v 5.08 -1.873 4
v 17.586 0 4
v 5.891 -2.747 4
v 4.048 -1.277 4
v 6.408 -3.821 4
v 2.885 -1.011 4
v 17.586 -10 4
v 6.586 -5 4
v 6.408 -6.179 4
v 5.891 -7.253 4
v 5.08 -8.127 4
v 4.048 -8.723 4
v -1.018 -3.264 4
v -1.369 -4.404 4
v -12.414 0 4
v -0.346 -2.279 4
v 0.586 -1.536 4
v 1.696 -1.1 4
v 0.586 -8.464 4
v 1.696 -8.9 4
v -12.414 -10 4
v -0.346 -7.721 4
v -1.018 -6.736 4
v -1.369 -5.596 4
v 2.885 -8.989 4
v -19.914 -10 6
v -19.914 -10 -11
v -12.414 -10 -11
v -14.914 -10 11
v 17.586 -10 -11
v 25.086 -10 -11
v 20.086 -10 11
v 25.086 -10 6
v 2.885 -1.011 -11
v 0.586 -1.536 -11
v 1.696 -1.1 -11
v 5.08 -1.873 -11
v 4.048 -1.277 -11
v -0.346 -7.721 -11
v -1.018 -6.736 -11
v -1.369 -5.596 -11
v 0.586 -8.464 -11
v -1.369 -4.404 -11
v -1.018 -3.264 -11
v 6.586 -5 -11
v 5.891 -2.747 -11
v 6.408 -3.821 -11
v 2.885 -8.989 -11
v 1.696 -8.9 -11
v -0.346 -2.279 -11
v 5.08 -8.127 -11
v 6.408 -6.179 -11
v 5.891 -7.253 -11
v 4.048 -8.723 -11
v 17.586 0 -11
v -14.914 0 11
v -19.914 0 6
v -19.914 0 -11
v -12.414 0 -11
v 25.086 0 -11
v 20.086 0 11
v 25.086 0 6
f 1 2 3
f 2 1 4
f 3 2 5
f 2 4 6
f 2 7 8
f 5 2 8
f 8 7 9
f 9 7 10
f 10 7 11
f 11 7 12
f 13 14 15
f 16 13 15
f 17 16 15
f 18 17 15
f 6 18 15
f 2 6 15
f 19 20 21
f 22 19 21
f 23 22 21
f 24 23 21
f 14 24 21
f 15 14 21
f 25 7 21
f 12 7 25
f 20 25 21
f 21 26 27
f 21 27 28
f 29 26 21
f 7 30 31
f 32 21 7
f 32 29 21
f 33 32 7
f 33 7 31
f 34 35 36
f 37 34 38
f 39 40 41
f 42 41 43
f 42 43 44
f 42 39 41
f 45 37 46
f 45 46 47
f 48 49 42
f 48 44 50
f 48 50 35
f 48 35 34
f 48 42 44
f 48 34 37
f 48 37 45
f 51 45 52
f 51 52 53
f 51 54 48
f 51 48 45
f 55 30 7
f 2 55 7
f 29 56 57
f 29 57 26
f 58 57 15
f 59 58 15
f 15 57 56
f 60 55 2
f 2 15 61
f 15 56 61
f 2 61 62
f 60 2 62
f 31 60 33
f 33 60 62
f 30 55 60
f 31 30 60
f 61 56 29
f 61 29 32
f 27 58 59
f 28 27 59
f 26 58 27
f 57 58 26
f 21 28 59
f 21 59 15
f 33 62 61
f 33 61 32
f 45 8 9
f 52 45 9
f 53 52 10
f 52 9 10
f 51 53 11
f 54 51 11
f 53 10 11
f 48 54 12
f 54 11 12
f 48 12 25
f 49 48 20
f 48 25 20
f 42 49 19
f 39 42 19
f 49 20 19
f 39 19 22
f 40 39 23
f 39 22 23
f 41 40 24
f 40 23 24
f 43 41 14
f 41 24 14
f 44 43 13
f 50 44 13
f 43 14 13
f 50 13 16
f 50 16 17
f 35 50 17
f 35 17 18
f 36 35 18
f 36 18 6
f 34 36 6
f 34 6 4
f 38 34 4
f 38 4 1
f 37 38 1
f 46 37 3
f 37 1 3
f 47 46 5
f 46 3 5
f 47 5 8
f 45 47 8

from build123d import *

# Parameters (mm, degrees)
F0_W     = 45
F0_H     = 22
F1_DEPTH = 10
F2_W     = 15
F2_H     = 15
F3_DEPTH = 25
F4_SIZE  = 5
F5_R     = 4
F6_DEPTH = 15


with BuildPart() as f1:
    # F0 (on Front) → F1 (new body)
    with BuildSketch(Plane.XZ):
        with Locations((2.586208, 0)):
            Rectangle(F0_W, F0_H)
    extrude(amount=F1_DEPTH)

    # F2 (on face) → F3 (cut)
    with BuildSketch(Plane.XZ.offset(10)):
        with Locations((-4.913792, -3.5)):
            Rectangle(F2_W, F2_H)
        with Locations((10.086208, -3.5)):
            Rectangle(F2_W, F2_H)
    extrude(amount=-F3_DEPTH, mode=Mode.SUBTRACT)

    # F4
    f4_edges = [f1.edges().sort_by_distance(p)[0] for p in [
        (-19.913792, -5, 11),
        (25.086208, -5, 11),
    ]]
    chamfer(f4_edges, length=F4_SIZE)

    # F5 (on face) → F6 (join, through all)
    with BuildSketch(Plane(origin=(0, 0, 4), x_dir=(1, 0, 0), z_dir=(0, 0, -1))):
        with Locations((2.586208, 5)):
            Circle(F5_R)
    extrude(amount=F6_DEPTH)


solid = f1.part
